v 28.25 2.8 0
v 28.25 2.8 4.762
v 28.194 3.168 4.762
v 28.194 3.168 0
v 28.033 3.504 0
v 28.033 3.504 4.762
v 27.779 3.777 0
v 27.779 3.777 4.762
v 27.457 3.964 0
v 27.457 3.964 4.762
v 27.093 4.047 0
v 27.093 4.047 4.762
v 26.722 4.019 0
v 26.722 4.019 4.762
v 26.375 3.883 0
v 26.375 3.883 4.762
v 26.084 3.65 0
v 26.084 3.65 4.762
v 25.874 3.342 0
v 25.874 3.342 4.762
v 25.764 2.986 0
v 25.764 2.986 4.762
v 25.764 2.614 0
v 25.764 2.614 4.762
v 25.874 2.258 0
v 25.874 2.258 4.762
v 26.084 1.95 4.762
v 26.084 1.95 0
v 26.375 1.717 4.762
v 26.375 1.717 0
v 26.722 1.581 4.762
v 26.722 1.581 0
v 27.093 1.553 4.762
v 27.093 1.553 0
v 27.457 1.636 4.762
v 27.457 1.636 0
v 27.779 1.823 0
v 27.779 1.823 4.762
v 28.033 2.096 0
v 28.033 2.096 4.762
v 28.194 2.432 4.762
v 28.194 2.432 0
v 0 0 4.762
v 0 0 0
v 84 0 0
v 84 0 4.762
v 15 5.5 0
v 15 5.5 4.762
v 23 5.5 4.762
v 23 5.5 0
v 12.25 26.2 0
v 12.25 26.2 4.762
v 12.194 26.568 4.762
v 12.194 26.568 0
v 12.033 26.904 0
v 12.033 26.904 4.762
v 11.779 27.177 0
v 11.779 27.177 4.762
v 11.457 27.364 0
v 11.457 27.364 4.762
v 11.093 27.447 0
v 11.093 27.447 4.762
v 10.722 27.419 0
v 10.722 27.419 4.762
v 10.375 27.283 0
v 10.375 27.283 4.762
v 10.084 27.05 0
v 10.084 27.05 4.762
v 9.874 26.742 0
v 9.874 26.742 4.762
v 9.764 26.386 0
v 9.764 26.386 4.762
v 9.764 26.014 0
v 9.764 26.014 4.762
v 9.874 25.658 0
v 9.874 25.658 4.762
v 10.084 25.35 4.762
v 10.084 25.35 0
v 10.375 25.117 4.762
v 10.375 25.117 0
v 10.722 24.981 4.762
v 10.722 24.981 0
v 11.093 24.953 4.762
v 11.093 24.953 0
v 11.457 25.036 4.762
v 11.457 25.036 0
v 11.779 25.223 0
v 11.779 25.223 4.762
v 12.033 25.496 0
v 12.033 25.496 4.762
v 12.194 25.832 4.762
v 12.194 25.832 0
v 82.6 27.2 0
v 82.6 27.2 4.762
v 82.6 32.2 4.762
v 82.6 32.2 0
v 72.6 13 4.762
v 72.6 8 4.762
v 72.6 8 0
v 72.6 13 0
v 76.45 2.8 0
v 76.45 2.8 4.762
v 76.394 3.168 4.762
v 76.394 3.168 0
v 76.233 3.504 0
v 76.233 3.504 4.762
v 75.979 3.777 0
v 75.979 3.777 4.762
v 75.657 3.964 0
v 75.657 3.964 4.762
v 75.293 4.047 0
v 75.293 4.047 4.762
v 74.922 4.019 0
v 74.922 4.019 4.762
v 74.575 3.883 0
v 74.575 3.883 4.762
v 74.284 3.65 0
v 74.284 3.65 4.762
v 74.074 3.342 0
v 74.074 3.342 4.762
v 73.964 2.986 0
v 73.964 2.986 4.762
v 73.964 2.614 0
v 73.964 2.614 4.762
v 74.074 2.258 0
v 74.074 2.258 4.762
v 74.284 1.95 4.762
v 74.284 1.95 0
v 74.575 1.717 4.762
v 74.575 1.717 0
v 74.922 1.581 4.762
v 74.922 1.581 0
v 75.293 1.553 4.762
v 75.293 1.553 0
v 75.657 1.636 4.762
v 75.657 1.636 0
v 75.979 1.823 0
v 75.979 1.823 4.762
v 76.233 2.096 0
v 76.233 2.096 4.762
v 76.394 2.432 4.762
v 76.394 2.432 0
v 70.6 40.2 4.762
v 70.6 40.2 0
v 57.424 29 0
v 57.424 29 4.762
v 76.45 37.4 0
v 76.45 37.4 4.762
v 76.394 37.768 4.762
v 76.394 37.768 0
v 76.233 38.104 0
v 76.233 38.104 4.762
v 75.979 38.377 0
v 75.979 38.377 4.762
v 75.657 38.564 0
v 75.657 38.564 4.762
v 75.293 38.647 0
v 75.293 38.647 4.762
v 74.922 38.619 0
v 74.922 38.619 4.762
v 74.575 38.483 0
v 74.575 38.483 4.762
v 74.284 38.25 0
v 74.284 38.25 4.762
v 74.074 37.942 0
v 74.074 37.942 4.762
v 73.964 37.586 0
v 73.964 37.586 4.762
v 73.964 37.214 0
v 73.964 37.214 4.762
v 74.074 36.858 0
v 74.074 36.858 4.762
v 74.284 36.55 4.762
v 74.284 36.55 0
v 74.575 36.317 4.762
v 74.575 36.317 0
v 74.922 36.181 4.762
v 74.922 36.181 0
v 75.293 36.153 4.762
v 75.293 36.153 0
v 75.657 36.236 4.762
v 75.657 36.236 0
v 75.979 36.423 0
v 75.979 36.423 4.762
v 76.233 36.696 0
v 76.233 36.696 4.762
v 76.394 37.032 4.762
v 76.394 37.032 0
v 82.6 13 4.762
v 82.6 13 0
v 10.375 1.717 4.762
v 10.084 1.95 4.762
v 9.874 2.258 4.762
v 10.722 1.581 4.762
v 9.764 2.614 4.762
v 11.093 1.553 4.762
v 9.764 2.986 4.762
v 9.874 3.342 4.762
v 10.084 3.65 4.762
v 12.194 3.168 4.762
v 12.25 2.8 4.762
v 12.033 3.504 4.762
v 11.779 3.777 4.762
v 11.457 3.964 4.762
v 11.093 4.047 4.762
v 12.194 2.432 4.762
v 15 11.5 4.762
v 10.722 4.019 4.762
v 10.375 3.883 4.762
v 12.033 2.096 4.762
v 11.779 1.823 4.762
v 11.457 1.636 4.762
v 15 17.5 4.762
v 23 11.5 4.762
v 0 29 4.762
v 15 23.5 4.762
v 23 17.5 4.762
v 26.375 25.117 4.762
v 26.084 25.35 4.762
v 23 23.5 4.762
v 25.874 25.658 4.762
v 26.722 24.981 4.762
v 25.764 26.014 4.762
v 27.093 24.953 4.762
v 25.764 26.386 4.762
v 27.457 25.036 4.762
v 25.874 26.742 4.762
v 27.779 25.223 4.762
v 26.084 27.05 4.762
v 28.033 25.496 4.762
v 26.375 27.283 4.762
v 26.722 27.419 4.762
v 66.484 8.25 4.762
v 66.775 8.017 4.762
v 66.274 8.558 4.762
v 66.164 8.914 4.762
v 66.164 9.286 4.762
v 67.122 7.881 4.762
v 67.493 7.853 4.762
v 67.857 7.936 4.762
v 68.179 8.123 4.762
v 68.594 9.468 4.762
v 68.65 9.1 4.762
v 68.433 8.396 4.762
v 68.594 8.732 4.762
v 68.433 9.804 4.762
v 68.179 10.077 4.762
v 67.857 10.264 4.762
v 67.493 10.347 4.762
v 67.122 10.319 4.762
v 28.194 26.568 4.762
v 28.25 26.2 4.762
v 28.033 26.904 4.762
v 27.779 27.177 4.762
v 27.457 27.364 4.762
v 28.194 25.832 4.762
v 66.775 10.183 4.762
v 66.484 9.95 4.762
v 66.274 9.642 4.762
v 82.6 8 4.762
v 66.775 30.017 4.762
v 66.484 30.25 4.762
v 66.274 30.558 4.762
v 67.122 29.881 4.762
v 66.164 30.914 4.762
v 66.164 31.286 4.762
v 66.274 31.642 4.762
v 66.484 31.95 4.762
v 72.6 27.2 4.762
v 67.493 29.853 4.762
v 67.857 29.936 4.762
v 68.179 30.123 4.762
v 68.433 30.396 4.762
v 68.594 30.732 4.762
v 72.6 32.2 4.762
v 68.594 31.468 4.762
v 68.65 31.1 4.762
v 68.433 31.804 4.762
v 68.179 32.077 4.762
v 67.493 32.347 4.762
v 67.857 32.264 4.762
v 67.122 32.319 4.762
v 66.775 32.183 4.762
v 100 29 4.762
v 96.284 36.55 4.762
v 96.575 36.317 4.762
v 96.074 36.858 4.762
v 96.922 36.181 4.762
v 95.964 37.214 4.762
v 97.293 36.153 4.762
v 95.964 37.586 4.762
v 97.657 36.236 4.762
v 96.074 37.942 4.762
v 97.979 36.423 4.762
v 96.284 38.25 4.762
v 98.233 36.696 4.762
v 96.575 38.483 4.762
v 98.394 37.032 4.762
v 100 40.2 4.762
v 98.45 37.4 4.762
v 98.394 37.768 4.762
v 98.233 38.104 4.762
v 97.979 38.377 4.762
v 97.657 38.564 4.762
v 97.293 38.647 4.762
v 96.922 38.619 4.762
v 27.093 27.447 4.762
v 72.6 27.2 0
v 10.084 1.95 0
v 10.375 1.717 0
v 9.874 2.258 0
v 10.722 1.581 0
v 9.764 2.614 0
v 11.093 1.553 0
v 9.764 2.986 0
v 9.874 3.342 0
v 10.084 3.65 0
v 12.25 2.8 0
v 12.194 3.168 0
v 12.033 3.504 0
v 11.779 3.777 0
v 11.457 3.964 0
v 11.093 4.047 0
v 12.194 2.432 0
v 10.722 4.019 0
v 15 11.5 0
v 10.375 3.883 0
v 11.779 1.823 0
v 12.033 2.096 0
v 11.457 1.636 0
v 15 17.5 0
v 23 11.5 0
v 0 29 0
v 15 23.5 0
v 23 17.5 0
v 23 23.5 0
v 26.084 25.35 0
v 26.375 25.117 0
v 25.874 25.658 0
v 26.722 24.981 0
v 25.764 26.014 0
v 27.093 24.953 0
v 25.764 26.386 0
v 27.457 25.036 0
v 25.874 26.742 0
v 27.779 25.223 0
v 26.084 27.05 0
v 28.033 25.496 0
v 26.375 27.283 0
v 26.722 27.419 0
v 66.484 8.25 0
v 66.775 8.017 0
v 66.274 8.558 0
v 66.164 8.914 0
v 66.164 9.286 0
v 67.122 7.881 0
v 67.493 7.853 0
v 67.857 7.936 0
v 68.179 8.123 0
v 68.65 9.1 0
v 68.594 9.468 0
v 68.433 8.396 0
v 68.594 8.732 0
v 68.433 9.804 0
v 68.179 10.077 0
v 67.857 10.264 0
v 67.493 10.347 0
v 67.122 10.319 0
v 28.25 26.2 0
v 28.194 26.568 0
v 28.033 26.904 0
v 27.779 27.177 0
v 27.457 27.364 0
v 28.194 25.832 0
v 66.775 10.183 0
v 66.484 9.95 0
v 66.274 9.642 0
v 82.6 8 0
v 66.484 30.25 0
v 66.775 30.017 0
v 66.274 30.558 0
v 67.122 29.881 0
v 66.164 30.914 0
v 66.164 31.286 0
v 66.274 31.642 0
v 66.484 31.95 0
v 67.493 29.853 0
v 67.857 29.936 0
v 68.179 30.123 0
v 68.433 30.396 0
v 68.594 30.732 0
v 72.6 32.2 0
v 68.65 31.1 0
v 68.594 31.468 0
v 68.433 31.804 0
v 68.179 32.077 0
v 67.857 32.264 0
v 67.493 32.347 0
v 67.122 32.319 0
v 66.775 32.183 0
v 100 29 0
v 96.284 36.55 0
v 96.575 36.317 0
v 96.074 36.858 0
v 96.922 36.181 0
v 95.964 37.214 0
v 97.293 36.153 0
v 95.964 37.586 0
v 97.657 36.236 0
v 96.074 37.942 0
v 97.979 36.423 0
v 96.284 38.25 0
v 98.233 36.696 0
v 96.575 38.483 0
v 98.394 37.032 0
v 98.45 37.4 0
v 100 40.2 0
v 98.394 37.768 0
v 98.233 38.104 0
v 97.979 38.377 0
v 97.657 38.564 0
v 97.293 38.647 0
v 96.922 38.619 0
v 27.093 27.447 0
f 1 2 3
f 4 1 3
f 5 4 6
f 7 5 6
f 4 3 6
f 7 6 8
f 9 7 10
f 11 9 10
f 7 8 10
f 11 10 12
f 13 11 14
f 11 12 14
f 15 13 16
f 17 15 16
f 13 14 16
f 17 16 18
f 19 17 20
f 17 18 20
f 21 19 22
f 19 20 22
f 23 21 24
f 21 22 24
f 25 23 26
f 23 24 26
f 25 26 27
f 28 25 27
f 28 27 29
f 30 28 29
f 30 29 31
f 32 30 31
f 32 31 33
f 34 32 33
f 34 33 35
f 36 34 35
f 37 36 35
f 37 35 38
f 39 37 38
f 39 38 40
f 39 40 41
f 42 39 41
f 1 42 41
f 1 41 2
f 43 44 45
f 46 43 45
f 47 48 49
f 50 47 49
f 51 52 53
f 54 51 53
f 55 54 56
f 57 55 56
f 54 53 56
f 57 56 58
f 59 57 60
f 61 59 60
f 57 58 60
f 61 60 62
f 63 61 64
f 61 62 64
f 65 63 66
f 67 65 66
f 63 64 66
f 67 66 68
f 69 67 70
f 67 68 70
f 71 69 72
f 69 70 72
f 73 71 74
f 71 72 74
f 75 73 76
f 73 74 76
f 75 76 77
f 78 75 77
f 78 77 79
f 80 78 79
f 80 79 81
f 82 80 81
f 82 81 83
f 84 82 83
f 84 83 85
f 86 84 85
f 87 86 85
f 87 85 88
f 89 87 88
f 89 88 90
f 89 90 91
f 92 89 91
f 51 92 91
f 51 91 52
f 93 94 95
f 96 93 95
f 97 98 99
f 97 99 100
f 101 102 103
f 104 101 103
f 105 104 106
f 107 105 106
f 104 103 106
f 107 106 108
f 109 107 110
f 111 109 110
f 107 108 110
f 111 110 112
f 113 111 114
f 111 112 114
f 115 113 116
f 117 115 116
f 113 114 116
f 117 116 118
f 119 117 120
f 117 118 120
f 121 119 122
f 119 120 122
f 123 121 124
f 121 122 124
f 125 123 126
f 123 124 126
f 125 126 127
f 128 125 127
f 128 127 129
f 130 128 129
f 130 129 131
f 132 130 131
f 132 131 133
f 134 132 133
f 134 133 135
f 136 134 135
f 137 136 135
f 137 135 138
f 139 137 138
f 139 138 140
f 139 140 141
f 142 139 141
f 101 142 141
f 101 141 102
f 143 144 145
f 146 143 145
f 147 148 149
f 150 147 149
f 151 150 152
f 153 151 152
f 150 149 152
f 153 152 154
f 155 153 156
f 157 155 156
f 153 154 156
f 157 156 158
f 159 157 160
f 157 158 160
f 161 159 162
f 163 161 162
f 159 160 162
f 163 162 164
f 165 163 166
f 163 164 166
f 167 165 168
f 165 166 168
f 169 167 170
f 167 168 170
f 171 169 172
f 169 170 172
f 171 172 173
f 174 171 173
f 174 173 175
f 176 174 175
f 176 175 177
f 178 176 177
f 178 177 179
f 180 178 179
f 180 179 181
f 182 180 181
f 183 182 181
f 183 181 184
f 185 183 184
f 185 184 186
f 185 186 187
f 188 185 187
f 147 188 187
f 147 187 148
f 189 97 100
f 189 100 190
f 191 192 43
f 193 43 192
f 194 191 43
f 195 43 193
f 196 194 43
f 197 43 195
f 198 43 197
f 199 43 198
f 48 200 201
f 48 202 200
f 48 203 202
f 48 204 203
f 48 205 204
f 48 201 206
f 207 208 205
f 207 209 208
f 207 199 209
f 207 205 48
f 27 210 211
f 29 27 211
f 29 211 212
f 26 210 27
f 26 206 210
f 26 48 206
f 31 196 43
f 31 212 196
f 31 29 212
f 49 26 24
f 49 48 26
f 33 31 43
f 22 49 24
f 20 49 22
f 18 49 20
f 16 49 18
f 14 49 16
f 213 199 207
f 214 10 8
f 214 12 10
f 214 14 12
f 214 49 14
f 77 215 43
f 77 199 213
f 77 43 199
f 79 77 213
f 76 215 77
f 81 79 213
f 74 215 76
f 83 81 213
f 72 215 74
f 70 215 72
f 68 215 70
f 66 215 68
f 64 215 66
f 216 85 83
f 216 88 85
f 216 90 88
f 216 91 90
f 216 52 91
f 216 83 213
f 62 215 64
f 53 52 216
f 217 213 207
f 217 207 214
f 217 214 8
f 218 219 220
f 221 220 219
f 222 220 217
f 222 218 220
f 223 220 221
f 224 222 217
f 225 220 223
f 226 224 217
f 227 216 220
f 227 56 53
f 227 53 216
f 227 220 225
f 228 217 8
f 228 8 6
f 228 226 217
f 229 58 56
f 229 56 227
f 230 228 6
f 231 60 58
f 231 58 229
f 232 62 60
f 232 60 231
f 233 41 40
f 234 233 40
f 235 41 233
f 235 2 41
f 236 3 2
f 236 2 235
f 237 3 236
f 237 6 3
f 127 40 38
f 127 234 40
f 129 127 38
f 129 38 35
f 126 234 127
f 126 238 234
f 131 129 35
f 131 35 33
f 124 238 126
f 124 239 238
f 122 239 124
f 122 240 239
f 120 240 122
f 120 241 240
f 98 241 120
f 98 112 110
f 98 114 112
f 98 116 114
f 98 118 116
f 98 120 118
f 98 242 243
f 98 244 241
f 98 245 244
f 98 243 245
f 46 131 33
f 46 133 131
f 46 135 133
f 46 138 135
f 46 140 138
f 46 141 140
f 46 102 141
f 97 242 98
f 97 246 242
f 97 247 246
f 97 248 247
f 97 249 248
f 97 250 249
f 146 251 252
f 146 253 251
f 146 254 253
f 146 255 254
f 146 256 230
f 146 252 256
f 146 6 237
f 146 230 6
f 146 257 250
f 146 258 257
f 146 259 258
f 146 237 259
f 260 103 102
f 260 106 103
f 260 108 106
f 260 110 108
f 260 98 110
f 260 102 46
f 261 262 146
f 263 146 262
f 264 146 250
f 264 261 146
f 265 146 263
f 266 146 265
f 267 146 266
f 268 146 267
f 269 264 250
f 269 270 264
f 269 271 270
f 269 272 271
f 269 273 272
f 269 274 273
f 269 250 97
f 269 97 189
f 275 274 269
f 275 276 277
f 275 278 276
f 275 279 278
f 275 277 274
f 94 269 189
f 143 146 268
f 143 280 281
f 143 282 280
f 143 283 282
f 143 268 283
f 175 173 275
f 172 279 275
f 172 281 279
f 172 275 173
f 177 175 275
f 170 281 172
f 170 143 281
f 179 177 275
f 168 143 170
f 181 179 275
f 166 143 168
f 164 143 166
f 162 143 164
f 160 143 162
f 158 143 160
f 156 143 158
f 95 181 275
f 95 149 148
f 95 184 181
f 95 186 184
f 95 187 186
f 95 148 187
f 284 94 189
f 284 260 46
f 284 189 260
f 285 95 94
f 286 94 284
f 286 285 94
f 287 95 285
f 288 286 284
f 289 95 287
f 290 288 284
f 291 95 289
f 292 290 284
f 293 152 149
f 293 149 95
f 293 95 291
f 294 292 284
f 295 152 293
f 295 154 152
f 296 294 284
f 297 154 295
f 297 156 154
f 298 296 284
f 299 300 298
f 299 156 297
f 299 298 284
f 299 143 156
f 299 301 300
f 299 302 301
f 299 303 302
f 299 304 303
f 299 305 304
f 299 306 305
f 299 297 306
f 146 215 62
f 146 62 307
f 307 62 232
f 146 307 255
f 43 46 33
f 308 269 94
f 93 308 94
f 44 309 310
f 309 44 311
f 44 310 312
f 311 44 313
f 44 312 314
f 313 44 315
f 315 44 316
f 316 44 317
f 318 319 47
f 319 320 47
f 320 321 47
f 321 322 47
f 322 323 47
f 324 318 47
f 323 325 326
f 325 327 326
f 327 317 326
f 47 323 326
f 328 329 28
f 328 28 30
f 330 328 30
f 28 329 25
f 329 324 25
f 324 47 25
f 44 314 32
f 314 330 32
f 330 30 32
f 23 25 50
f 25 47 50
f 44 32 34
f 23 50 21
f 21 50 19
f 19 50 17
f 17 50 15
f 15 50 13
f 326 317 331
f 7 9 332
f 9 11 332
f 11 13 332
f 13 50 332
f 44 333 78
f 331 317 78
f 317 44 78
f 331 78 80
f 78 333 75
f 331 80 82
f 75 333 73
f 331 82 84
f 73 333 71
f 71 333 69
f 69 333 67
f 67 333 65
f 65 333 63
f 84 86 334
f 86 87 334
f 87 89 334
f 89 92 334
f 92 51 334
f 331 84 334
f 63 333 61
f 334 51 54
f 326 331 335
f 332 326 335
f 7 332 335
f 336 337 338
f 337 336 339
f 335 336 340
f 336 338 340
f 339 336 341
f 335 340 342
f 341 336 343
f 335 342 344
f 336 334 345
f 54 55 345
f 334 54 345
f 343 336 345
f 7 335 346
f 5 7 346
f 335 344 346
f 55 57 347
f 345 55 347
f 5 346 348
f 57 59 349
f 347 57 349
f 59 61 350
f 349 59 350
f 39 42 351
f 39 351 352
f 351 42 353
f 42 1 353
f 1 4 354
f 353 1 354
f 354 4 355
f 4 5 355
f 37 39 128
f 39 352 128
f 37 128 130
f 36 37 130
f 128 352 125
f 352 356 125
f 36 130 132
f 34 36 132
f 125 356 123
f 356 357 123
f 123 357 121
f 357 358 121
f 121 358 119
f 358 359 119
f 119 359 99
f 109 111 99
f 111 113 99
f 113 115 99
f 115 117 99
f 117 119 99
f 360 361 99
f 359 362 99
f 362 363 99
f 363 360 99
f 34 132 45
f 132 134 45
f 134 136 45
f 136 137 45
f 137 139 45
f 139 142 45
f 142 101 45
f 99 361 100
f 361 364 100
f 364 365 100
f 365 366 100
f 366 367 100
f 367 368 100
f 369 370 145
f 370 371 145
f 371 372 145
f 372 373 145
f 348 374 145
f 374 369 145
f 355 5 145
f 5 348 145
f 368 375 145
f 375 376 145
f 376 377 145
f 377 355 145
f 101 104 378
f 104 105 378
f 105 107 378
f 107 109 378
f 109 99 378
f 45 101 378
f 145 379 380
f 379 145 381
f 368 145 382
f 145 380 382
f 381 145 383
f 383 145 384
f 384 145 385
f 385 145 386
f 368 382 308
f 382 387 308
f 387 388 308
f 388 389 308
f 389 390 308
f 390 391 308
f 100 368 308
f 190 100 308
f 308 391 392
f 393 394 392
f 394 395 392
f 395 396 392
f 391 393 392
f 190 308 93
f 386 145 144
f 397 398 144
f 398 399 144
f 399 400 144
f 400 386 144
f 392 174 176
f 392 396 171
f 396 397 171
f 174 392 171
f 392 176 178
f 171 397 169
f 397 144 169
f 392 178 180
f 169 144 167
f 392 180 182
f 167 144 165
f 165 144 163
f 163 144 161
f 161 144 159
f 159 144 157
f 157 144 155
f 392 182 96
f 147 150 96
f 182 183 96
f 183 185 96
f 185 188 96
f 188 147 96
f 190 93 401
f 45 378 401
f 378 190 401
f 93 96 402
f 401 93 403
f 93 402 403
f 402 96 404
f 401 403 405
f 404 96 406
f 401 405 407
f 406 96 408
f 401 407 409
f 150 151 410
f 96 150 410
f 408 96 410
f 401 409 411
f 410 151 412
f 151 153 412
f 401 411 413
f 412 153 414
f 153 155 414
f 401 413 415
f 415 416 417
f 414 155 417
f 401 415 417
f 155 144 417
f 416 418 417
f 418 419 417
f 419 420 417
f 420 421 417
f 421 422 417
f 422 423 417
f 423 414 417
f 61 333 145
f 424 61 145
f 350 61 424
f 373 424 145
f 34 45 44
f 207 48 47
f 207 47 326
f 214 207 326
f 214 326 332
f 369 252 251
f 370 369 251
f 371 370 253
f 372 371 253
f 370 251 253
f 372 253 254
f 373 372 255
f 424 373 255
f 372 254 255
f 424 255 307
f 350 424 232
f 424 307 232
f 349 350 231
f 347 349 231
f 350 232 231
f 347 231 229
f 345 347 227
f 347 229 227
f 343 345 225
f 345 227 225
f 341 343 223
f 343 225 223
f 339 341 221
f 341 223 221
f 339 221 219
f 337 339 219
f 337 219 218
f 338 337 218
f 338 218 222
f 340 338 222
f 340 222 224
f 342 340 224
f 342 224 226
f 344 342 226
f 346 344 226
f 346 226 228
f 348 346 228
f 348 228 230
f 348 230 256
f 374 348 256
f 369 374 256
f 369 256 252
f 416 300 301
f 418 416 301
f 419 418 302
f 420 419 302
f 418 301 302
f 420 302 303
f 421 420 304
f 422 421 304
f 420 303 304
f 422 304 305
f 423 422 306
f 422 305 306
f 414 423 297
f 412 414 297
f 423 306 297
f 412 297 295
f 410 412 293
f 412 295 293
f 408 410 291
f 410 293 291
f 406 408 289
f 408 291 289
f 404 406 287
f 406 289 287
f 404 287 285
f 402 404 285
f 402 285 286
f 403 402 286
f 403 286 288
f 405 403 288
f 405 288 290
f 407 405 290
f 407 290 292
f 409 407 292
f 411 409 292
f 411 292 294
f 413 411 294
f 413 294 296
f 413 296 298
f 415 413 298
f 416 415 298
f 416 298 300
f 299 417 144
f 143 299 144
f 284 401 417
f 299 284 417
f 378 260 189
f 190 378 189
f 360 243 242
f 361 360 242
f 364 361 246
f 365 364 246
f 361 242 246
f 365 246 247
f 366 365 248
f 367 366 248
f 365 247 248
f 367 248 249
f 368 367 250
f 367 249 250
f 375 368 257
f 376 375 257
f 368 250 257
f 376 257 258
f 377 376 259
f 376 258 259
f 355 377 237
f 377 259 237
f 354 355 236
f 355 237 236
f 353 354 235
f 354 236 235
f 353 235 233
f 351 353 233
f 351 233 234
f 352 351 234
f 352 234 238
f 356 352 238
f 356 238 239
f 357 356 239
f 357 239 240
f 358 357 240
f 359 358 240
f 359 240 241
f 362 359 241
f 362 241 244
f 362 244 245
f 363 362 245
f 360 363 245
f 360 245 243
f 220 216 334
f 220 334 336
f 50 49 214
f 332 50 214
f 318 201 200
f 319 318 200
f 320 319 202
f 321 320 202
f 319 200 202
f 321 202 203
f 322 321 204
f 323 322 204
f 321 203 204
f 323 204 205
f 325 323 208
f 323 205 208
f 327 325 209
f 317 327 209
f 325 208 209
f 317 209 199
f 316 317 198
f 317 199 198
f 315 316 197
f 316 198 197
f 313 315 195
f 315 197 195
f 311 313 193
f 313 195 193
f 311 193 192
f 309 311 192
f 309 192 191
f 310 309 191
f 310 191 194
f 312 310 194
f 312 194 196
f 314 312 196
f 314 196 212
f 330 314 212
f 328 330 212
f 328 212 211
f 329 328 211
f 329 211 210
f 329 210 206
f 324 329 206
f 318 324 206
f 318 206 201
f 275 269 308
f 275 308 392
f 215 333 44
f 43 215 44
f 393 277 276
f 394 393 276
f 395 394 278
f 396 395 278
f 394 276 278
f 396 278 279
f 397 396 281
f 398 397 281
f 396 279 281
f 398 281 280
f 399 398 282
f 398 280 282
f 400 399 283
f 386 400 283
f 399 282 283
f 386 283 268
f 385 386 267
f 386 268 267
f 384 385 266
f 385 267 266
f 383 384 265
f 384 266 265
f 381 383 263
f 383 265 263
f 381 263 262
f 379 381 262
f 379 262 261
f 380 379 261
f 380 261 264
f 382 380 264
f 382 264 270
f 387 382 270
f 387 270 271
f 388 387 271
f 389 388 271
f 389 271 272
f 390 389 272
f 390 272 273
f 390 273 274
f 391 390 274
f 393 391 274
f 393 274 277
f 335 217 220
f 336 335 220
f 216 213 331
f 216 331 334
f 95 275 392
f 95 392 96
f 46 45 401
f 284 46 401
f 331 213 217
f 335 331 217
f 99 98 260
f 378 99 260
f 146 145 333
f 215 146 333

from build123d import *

# Parameters (mm, degrees)
BOSS_EXTRUDE1_DEPTH = 4.7625
SKETCH2_R           = 1.25
SKETCH2_W           = 10
SKETCH2_H           = 5
SKETCH2_W_2         = 8
SKETCH2_H_2         = 6
CUT_EXTRUDE1_DEPTH  = 5.7625


with BuildPart() as part:
    # Sketch1 → Boss-Extrude1 (new body)
    with BuildSketch(Plane.XY):
        Polygon((70.6, 40.2), (57.423529412, 29), (0, 29), (0, 0), (84, 0), (100, 29), (100, 40.2), align=None)
    extrude(amount=BOSS_EXTRUDE1_DEPTH)

    # Sketch2 → Cut-Extrude1 (cut, through all)
    with BuildSketch(Plane.XY.offset(4.7625)):
        with Locations((97.2, 37.4)):
            Circle(SKETCH2_R)
        with Locations((75.2, 37.4)):
            Circle(SKETCH2_R)
        with Locations((67.4, 31.1)):
            Circle(SKETCH2_R)
        with Locations((67.4, 9.1)):
            Circle(SKETCH2_R)
        with Locations((75.2, 2.8)):
            Circle(SKETCH2_R)
        with Locations((11, 26.2)):
            Circle(SKETCH2_R)
        with Locations((27, 26.2)):
            Circle(SKETCH2_R)
        with Locations((27, 2.8)):
            Circle(SKETCH2_R)
        with Locations((11, 2.8)):
            Circle(SKETCH2_R)
        with Locations((77.6, 29.7)):
            Rectangle(SKETCH2_W, SKETCH2_H)
        with Locations((77.6, 10.5)):
            Rectangle(SKETCH2_W, SKETCH2_H)
        with Locations((19, 20.5)):
            Rectangle(SKETCH2_W_2, SKETCH2_H_2)
        with Locations((19, 8.5)):
            Rectangle(SKETCH2_W_2, SKETCH2_H_2)
    extrude(amount=-CUT_EXTRUDE1_DEPTH, mode=Mode.SUBTRACT)


solid = part.part
